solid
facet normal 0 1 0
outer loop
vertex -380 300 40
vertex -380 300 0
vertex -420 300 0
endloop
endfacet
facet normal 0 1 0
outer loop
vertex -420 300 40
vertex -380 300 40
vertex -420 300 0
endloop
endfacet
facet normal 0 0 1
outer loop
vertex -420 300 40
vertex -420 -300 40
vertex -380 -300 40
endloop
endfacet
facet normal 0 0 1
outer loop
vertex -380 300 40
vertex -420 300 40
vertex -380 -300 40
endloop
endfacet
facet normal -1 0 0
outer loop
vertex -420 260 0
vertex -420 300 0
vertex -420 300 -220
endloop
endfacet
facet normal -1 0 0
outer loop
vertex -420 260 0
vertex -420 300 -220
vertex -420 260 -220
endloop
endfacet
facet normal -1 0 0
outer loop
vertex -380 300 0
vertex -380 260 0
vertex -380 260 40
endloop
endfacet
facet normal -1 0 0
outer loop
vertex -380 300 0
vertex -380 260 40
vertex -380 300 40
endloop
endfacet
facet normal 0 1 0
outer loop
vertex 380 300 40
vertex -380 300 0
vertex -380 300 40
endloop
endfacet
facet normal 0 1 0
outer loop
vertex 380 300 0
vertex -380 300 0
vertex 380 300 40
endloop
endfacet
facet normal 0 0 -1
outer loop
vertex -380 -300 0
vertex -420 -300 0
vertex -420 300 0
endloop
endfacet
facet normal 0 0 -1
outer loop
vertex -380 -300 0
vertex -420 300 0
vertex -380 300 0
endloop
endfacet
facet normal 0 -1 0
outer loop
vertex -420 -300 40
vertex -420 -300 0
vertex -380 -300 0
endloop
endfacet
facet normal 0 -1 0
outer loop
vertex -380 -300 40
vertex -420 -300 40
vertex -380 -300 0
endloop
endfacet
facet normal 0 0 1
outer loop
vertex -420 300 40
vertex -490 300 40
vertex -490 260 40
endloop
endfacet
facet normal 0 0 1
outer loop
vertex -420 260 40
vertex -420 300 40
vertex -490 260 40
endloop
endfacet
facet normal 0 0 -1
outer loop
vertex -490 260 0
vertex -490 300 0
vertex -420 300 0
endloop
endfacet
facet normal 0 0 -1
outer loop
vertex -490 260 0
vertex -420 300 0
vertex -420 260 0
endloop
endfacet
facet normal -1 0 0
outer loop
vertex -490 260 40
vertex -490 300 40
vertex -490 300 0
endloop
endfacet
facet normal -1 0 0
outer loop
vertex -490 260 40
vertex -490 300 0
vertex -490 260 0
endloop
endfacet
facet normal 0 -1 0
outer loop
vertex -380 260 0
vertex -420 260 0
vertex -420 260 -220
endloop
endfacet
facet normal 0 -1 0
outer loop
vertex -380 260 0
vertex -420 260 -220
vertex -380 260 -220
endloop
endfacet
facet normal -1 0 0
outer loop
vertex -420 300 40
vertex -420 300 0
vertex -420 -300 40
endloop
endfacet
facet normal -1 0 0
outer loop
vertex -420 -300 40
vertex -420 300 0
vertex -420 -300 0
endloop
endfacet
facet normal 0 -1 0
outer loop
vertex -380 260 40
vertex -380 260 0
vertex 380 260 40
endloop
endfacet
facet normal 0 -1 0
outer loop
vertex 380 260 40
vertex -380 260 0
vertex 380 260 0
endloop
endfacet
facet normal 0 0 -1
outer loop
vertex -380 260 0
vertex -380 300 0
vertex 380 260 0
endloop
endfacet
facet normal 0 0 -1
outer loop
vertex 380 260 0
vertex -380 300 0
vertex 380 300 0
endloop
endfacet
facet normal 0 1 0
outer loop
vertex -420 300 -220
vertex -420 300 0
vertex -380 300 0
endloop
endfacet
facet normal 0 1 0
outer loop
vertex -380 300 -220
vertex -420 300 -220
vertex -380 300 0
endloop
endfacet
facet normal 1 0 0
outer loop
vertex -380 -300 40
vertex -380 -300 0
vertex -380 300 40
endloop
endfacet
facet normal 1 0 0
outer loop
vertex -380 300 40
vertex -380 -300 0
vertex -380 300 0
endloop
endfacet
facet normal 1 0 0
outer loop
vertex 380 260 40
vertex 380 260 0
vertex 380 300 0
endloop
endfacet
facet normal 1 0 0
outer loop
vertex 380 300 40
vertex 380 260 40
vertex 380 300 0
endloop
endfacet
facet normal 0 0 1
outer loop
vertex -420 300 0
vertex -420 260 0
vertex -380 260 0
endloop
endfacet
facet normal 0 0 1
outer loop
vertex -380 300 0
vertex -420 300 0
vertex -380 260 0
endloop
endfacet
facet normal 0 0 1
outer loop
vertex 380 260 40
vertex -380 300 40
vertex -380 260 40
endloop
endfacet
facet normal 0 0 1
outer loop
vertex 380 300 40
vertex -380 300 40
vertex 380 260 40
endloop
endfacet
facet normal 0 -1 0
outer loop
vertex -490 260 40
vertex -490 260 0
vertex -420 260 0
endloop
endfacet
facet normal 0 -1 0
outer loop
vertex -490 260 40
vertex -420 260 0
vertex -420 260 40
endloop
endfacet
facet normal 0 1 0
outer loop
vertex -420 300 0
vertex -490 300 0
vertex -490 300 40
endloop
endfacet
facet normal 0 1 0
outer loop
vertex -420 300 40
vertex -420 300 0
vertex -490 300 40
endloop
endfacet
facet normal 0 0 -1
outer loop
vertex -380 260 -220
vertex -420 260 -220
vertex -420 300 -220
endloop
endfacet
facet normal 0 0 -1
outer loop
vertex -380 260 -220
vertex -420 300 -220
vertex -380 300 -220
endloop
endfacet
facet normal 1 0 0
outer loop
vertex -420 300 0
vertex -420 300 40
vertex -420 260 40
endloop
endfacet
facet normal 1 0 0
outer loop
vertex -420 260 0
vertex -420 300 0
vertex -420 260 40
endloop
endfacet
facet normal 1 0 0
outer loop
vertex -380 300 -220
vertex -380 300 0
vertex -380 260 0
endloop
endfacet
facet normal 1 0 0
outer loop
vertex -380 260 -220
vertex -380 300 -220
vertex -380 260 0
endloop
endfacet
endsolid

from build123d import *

# Parameters (mm, degrees)
F1_DEPTH = 40
F0_W     = 760
F0_H     = 40
F2_DEPTH = 40
F3_W     = 40
F3_H     = 40
F4_DEPTH = 220
F5_W     = 40
F5_H     = 40
F6_DEPTH = 70


with BuildPart() as f1:
    # F0 (on Top) → F1 (new body)
    with BuildSketch(Plane.XY):
        Polygon((-380, -260), (-380, 260), (-380, 300), (-420, 300), (-420, -300), (-380, -300), align=None)
    extrude(amount=F1_DEPTH)


with BuildPart() as f2:
    # F0 (on Top) → F2 (new body, through all)
    with BuildSketch(Plane.XY):
        with Locations((0, 280)):
            Rectangle(F0_W, F0_H)
    extrude(amount=F2_DEPTH)


with BuildPart() as f4:
    # F3 (on face) → F4 (new body)
    with BuildSketch(Plane(origin=(0, 0, 0), x_dir=(1, 0, 0), z_dir=(0, 0, -1))):
        with Locations((-400, -280)):
            Rectangle(F3_W, F3_H)
    extrude(amount=F4_DEPTH)


with BuildPart() as f6:
    # F5 (on face) → F6 (new body)
    with BuildSketch(Plane(origin=(-420, 0, 0), x_dir=(0, -1, 0), z_dir=(-1, 0, 0))):
        with Locations((-280, 20)):
            Rectangle(F5_W, F5_H)
    extrude(amount=F6_DEPTH)


solid = Compound([f1.part, f2.part, f4.part, f6.part])
